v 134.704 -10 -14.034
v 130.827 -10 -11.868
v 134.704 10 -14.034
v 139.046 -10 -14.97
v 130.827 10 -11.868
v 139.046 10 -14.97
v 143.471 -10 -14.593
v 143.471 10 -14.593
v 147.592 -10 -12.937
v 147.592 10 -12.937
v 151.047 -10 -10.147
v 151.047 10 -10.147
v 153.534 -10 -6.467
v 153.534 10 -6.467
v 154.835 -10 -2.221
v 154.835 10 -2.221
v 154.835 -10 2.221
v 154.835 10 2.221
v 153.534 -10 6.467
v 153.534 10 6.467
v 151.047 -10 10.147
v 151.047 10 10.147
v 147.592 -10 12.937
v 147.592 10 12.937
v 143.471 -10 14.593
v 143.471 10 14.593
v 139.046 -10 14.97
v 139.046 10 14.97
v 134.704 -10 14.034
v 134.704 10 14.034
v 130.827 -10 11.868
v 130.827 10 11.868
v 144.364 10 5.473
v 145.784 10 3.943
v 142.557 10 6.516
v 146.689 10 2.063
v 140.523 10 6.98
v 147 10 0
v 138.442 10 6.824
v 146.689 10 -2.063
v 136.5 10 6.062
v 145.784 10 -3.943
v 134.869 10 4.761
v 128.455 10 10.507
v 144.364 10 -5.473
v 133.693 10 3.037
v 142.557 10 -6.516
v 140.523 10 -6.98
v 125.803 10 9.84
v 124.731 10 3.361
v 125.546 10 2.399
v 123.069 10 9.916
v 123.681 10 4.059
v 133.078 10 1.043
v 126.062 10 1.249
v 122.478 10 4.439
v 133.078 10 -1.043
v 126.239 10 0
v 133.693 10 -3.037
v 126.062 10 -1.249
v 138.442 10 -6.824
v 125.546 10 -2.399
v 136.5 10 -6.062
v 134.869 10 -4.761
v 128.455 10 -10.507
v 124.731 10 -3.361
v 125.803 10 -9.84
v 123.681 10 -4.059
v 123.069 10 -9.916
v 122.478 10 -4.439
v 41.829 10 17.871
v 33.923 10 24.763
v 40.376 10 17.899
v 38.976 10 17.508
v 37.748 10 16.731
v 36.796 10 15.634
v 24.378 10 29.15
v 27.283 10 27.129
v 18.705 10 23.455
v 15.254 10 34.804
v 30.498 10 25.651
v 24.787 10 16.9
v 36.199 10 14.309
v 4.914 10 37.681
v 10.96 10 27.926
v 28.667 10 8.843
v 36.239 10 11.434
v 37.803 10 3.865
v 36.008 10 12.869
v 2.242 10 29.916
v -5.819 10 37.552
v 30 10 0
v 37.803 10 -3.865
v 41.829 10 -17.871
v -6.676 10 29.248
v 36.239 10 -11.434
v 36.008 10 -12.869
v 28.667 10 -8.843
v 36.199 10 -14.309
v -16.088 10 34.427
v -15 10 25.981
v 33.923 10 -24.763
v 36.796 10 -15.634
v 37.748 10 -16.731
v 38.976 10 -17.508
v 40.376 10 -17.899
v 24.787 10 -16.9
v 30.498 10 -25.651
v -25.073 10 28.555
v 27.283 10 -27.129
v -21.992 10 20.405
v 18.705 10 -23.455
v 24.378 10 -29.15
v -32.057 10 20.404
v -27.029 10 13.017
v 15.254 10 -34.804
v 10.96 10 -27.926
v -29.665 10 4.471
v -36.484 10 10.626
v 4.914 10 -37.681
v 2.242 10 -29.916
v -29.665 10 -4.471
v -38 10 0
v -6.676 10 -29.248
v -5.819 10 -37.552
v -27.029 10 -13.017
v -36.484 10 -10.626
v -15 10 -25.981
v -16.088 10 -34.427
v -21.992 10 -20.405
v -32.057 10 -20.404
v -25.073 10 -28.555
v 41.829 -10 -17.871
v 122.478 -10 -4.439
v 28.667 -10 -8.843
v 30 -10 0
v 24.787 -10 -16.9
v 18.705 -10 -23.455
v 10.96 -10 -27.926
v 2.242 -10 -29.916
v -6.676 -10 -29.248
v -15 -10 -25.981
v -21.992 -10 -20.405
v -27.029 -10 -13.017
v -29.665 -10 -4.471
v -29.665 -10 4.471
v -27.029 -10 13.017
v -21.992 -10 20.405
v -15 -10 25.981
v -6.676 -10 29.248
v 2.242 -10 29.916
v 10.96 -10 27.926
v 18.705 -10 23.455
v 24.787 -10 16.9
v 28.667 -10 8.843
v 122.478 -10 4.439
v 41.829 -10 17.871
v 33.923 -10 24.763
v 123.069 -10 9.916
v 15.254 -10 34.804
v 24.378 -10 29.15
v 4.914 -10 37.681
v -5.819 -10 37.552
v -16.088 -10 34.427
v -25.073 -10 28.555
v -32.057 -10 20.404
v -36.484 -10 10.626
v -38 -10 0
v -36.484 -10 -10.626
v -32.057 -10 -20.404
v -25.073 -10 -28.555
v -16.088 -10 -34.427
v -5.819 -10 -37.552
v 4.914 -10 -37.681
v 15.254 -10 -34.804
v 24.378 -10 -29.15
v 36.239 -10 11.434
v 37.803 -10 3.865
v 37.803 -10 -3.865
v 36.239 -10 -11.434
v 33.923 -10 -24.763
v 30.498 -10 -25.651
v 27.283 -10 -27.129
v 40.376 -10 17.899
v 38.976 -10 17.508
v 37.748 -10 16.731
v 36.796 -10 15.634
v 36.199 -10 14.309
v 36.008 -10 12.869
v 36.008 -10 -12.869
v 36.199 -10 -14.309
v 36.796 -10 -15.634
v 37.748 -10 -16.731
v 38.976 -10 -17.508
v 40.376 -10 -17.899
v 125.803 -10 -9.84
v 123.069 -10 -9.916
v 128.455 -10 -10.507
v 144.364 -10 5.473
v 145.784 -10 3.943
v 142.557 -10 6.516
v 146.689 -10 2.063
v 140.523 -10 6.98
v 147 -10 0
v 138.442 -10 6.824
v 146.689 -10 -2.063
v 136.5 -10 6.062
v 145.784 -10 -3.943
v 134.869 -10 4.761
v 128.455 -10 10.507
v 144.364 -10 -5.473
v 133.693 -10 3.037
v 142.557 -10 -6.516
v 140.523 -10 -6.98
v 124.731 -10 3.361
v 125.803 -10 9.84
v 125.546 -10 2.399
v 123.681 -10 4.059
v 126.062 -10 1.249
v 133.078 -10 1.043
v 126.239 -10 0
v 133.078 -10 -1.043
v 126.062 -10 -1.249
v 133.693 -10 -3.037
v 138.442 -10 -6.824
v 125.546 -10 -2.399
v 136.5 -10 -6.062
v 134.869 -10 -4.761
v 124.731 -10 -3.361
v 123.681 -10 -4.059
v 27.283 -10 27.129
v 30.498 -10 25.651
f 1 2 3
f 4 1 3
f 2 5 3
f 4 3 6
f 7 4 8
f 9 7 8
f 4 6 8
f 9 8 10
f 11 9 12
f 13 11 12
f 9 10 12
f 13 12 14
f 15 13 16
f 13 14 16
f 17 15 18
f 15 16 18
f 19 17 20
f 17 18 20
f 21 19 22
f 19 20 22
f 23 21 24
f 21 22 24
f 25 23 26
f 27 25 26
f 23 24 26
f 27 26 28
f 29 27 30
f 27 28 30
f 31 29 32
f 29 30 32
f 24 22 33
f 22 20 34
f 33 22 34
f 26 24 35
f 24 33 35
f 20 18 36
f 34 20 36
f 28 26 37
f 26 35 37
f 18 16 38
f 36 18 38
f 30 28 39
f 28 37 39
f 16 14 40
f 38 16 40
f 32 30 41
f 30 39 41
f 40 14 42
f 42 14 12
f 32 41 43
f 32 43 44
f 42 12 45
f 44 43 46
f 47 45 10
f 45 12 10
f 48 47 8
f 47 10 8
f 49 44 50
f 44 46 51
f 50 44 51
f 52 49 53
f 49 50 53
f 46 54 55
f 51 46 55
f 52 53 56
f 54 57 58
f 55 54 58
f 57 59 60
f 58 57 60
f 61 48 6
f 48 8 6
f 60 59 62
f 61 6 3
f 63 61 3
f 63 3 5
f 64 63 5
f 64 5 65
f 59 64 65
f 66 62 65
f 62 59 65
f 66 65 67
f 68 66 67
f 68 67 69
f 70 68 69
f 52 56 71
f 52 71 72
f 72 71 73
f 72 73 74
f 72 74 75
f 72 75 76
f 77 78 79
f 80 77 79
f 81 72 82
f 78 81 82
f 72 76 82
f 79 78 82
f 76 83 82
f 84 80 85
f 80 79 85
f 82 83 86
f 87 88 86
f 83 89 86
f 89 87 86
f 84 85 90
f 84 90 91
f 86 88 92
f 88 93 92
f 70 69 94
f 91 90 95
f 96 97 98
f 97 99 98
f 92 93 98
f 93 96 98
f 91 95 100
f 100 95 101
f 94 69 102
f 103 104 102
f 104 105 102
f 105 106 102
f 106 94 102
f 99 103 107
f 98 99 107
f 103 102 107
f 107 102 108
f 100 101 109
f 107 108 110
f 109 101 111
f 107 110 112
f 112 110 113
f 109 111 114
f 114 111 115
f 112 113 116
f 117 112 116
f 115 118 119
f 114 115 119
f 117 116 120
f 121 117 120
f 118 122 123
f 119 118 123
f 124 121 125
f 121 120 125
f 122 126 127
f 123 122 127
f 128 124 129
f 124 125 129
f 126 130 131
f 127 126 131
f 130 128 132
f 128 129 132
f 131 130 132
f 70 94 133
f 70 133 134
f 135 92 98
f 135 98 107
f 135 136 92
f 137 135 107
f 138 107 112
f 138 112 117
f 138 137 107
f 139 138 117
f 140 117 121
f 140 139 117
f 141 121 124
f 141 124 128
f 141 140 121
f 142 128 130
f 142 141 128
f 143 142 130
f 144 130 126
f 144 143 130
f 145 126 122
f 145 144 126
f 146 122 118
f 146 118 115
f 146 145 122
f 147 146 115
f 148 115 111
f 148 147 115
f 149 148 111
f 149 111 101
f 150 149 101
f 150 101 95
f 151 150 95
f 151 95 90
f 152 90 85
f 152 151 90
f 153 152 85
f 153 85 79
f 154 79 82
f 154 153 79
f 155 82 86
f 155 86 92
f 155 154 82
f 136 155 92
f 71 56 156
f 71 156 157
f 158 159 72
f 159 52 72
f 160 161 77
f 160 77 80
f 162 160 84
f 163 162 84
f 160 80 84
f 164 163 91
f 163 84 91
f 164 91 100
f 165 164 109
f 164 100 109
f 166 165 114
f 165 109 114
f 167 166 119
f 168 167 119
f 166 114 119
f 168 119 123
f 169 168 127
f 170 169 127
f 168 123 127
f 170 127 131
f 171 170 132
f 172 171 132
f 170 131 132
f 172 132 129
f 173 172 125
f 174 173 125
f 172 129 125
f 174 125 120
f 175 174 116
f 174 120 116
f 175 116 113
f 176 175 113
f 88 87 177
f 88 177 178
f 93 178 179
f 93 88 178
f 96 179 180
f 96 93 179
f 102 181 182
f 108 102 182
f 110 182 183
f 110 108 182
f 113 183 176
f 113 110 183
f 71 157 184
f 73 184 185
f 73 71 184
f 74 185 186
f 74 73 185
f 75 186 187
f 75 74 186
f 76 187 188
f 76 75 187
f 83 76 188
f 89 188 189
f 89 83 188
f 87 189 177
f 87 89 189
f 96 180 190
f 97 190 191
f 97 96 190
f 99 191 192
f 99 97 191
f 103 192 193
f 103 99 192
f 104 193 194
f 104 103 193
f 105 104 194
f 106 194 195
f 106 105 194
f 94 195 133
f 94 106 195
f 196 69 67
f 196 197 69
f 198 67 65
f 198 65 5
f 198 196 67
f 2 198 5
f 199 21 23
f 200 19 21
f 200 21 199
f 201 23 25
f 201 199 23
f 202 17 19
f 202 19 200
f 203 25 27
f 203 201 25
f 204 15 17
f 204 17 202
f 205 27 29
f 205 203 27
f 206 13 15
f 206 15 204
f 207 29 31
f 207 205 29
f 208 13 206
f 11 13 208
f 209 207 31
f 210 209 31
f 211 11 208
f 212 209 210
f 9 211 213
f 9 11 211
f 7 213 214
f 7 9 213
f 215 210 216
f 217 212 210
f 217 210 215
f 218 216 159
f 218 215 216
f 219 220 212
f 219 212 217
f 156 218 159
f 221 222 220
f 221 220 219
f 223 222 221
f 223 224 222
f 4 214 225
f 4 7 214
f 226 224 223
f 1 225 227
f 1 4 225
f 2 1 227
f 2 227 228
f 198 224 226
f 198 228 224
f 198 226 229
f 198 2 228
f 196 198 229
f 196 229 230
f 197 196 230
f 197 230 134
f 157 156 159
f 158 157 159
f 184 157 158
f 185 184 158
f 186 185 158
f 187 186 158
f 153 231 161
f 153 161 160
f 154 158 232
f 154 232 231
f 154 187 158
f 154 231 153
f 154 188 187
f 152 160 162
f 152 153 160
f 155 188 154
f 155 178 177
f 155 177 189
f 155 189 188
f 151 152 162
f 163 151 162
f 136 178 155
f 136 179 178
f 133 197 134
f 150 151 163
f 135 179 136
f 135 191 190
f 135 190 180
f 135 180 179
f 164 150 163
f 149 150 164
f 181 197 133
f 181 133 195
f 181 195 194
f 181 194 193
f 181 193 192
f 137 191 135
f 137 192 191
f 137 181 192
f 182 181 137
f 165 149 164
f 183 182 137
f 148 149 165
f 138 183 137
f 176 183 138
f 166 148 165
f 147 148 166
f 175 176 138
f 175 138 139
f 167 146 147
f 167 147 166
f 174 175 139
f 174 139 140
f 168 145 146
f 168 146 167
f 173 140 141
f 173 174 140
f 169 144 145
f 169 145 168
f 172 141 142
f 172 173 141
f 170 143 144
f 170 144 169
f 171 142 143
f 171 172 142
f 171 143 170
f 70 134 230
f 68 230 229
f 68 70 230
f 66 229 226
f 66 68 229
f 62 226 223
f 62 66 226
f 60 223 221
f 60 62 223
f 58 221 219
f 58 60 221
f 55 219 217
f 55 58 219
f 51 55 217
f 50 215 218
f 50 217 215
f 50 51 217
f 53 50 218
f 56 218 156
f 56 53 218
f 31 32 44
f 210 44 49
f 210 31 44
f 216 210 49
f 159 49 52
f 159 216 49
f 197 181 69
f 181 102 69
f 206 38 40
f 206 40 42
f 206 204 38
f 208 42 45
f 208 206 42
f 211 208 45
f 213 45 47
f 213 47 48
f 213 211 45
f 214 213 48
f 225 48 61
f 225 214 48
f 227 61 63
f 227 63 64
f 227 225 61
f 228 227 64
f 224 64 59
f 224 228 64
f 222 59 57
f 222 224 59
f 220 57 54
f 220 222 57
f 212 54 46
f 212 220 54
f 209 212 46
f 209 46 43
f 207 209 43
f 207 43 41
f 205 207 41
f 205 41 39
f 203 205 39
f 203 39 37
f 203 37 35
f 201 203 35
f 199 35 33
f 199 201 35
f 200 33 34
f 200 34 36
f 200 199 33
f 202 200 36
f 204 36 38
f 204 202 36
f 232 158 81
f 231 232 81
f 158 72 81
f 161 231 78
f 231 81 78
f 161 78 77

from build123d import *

# Parameters (mm, degrees)
SKETCH1_R           = 30
SKETCH1_R_2         = 7
BOSS_EXTRUDE1_DEPTH = 10
FILLET1_R           = 20
FILLET2_R           = 10
CUT_EXTRUDE1_DEPTH  = 21


with BuildPart() as part:
    # Sketch1 → Boss-Extrude1 (new body, symmetric)
    with BuildSketch(Plane(origin=(0, 0, 0), x_dir=(1, 0, 0), z_dir=(0, 1, 0))):
        with BuildLine():
            Line((27.935473676, 25.760615491), (128.063755469, 9.084385863))
            ThreePointArc((128.063755469, 9.084385863), (155, 0), (128.063755469, -9.084385863))
            Line((128.063755469, -9.084385863), (27.935473676, -25.760615491))
            ThreePointArc((27.935473676, -25.760615491), (-38, 0), (27.935473676, 25.760615491))
        make_face()
        Circle(SKETCH1_R, mode=Mode.SUBTRACT)
        with Locations((140, 0)):
            Circle(SKETCH1_R_2, mode=Mode.SUBTRACT)
    extrude(amount=BOSS_EXTRUDE1_DEPTH, both=True)

    # Fillet1
    fillet1_edges = [part.edges().sort_by_distance(p)[0] for p in [
        (27.935473676, 0, -25.760615491),
        (27.935473676, 0, 25.760615491),
    ]]
    fillet(fillet1_edges, radius=FILLET1_R)

    # Fillet2
    fillet2_edges = [part.edges().sort_by_distance(p)[0] for p in [
        (128.063755469, 0, -9.084385863),
        (128.063755469, 0, 9.084385863),
    ]]
    fillet(fillet2_edges, radius=FILLET2_R)

    # Sketch2 → Cut-Extrude1 (cut, through all)
    with BuildSketch(Plane(origin=(0, 10, 0), x_dir=(1, 0, 0), z_dir=(0, 1, 0))):
        with BuildLine():
            Line((41.828554558, 17.870982725), (122.478416149, 4.438857582))
            ThreePointArc((122.478416149, 4.438857582), (126.239130435, 0), (122.478416149, -4.438857582))
            Line((122.478416149, -4.438857582), (41.828554558, -17.870982725))
            ThreePointArc((41.828554558, -17.870982725), (37.231968897, -16.217361812), (36.238855523, -11.43439331))
            ThreePointArc((36.238855523, -11.43439331), (38, 0), (36.238855523, 11.43439331))
            ThreePointArc((36.238855523, 11.43439331), (37.231968897, 16.217361812), (41.828554558, 17.870982725))
        make_face()
    extrude(amount=-CUT_EXTRUDE1_DEPTH, mode=Mode.SUBTRACT)


solid = part.part
